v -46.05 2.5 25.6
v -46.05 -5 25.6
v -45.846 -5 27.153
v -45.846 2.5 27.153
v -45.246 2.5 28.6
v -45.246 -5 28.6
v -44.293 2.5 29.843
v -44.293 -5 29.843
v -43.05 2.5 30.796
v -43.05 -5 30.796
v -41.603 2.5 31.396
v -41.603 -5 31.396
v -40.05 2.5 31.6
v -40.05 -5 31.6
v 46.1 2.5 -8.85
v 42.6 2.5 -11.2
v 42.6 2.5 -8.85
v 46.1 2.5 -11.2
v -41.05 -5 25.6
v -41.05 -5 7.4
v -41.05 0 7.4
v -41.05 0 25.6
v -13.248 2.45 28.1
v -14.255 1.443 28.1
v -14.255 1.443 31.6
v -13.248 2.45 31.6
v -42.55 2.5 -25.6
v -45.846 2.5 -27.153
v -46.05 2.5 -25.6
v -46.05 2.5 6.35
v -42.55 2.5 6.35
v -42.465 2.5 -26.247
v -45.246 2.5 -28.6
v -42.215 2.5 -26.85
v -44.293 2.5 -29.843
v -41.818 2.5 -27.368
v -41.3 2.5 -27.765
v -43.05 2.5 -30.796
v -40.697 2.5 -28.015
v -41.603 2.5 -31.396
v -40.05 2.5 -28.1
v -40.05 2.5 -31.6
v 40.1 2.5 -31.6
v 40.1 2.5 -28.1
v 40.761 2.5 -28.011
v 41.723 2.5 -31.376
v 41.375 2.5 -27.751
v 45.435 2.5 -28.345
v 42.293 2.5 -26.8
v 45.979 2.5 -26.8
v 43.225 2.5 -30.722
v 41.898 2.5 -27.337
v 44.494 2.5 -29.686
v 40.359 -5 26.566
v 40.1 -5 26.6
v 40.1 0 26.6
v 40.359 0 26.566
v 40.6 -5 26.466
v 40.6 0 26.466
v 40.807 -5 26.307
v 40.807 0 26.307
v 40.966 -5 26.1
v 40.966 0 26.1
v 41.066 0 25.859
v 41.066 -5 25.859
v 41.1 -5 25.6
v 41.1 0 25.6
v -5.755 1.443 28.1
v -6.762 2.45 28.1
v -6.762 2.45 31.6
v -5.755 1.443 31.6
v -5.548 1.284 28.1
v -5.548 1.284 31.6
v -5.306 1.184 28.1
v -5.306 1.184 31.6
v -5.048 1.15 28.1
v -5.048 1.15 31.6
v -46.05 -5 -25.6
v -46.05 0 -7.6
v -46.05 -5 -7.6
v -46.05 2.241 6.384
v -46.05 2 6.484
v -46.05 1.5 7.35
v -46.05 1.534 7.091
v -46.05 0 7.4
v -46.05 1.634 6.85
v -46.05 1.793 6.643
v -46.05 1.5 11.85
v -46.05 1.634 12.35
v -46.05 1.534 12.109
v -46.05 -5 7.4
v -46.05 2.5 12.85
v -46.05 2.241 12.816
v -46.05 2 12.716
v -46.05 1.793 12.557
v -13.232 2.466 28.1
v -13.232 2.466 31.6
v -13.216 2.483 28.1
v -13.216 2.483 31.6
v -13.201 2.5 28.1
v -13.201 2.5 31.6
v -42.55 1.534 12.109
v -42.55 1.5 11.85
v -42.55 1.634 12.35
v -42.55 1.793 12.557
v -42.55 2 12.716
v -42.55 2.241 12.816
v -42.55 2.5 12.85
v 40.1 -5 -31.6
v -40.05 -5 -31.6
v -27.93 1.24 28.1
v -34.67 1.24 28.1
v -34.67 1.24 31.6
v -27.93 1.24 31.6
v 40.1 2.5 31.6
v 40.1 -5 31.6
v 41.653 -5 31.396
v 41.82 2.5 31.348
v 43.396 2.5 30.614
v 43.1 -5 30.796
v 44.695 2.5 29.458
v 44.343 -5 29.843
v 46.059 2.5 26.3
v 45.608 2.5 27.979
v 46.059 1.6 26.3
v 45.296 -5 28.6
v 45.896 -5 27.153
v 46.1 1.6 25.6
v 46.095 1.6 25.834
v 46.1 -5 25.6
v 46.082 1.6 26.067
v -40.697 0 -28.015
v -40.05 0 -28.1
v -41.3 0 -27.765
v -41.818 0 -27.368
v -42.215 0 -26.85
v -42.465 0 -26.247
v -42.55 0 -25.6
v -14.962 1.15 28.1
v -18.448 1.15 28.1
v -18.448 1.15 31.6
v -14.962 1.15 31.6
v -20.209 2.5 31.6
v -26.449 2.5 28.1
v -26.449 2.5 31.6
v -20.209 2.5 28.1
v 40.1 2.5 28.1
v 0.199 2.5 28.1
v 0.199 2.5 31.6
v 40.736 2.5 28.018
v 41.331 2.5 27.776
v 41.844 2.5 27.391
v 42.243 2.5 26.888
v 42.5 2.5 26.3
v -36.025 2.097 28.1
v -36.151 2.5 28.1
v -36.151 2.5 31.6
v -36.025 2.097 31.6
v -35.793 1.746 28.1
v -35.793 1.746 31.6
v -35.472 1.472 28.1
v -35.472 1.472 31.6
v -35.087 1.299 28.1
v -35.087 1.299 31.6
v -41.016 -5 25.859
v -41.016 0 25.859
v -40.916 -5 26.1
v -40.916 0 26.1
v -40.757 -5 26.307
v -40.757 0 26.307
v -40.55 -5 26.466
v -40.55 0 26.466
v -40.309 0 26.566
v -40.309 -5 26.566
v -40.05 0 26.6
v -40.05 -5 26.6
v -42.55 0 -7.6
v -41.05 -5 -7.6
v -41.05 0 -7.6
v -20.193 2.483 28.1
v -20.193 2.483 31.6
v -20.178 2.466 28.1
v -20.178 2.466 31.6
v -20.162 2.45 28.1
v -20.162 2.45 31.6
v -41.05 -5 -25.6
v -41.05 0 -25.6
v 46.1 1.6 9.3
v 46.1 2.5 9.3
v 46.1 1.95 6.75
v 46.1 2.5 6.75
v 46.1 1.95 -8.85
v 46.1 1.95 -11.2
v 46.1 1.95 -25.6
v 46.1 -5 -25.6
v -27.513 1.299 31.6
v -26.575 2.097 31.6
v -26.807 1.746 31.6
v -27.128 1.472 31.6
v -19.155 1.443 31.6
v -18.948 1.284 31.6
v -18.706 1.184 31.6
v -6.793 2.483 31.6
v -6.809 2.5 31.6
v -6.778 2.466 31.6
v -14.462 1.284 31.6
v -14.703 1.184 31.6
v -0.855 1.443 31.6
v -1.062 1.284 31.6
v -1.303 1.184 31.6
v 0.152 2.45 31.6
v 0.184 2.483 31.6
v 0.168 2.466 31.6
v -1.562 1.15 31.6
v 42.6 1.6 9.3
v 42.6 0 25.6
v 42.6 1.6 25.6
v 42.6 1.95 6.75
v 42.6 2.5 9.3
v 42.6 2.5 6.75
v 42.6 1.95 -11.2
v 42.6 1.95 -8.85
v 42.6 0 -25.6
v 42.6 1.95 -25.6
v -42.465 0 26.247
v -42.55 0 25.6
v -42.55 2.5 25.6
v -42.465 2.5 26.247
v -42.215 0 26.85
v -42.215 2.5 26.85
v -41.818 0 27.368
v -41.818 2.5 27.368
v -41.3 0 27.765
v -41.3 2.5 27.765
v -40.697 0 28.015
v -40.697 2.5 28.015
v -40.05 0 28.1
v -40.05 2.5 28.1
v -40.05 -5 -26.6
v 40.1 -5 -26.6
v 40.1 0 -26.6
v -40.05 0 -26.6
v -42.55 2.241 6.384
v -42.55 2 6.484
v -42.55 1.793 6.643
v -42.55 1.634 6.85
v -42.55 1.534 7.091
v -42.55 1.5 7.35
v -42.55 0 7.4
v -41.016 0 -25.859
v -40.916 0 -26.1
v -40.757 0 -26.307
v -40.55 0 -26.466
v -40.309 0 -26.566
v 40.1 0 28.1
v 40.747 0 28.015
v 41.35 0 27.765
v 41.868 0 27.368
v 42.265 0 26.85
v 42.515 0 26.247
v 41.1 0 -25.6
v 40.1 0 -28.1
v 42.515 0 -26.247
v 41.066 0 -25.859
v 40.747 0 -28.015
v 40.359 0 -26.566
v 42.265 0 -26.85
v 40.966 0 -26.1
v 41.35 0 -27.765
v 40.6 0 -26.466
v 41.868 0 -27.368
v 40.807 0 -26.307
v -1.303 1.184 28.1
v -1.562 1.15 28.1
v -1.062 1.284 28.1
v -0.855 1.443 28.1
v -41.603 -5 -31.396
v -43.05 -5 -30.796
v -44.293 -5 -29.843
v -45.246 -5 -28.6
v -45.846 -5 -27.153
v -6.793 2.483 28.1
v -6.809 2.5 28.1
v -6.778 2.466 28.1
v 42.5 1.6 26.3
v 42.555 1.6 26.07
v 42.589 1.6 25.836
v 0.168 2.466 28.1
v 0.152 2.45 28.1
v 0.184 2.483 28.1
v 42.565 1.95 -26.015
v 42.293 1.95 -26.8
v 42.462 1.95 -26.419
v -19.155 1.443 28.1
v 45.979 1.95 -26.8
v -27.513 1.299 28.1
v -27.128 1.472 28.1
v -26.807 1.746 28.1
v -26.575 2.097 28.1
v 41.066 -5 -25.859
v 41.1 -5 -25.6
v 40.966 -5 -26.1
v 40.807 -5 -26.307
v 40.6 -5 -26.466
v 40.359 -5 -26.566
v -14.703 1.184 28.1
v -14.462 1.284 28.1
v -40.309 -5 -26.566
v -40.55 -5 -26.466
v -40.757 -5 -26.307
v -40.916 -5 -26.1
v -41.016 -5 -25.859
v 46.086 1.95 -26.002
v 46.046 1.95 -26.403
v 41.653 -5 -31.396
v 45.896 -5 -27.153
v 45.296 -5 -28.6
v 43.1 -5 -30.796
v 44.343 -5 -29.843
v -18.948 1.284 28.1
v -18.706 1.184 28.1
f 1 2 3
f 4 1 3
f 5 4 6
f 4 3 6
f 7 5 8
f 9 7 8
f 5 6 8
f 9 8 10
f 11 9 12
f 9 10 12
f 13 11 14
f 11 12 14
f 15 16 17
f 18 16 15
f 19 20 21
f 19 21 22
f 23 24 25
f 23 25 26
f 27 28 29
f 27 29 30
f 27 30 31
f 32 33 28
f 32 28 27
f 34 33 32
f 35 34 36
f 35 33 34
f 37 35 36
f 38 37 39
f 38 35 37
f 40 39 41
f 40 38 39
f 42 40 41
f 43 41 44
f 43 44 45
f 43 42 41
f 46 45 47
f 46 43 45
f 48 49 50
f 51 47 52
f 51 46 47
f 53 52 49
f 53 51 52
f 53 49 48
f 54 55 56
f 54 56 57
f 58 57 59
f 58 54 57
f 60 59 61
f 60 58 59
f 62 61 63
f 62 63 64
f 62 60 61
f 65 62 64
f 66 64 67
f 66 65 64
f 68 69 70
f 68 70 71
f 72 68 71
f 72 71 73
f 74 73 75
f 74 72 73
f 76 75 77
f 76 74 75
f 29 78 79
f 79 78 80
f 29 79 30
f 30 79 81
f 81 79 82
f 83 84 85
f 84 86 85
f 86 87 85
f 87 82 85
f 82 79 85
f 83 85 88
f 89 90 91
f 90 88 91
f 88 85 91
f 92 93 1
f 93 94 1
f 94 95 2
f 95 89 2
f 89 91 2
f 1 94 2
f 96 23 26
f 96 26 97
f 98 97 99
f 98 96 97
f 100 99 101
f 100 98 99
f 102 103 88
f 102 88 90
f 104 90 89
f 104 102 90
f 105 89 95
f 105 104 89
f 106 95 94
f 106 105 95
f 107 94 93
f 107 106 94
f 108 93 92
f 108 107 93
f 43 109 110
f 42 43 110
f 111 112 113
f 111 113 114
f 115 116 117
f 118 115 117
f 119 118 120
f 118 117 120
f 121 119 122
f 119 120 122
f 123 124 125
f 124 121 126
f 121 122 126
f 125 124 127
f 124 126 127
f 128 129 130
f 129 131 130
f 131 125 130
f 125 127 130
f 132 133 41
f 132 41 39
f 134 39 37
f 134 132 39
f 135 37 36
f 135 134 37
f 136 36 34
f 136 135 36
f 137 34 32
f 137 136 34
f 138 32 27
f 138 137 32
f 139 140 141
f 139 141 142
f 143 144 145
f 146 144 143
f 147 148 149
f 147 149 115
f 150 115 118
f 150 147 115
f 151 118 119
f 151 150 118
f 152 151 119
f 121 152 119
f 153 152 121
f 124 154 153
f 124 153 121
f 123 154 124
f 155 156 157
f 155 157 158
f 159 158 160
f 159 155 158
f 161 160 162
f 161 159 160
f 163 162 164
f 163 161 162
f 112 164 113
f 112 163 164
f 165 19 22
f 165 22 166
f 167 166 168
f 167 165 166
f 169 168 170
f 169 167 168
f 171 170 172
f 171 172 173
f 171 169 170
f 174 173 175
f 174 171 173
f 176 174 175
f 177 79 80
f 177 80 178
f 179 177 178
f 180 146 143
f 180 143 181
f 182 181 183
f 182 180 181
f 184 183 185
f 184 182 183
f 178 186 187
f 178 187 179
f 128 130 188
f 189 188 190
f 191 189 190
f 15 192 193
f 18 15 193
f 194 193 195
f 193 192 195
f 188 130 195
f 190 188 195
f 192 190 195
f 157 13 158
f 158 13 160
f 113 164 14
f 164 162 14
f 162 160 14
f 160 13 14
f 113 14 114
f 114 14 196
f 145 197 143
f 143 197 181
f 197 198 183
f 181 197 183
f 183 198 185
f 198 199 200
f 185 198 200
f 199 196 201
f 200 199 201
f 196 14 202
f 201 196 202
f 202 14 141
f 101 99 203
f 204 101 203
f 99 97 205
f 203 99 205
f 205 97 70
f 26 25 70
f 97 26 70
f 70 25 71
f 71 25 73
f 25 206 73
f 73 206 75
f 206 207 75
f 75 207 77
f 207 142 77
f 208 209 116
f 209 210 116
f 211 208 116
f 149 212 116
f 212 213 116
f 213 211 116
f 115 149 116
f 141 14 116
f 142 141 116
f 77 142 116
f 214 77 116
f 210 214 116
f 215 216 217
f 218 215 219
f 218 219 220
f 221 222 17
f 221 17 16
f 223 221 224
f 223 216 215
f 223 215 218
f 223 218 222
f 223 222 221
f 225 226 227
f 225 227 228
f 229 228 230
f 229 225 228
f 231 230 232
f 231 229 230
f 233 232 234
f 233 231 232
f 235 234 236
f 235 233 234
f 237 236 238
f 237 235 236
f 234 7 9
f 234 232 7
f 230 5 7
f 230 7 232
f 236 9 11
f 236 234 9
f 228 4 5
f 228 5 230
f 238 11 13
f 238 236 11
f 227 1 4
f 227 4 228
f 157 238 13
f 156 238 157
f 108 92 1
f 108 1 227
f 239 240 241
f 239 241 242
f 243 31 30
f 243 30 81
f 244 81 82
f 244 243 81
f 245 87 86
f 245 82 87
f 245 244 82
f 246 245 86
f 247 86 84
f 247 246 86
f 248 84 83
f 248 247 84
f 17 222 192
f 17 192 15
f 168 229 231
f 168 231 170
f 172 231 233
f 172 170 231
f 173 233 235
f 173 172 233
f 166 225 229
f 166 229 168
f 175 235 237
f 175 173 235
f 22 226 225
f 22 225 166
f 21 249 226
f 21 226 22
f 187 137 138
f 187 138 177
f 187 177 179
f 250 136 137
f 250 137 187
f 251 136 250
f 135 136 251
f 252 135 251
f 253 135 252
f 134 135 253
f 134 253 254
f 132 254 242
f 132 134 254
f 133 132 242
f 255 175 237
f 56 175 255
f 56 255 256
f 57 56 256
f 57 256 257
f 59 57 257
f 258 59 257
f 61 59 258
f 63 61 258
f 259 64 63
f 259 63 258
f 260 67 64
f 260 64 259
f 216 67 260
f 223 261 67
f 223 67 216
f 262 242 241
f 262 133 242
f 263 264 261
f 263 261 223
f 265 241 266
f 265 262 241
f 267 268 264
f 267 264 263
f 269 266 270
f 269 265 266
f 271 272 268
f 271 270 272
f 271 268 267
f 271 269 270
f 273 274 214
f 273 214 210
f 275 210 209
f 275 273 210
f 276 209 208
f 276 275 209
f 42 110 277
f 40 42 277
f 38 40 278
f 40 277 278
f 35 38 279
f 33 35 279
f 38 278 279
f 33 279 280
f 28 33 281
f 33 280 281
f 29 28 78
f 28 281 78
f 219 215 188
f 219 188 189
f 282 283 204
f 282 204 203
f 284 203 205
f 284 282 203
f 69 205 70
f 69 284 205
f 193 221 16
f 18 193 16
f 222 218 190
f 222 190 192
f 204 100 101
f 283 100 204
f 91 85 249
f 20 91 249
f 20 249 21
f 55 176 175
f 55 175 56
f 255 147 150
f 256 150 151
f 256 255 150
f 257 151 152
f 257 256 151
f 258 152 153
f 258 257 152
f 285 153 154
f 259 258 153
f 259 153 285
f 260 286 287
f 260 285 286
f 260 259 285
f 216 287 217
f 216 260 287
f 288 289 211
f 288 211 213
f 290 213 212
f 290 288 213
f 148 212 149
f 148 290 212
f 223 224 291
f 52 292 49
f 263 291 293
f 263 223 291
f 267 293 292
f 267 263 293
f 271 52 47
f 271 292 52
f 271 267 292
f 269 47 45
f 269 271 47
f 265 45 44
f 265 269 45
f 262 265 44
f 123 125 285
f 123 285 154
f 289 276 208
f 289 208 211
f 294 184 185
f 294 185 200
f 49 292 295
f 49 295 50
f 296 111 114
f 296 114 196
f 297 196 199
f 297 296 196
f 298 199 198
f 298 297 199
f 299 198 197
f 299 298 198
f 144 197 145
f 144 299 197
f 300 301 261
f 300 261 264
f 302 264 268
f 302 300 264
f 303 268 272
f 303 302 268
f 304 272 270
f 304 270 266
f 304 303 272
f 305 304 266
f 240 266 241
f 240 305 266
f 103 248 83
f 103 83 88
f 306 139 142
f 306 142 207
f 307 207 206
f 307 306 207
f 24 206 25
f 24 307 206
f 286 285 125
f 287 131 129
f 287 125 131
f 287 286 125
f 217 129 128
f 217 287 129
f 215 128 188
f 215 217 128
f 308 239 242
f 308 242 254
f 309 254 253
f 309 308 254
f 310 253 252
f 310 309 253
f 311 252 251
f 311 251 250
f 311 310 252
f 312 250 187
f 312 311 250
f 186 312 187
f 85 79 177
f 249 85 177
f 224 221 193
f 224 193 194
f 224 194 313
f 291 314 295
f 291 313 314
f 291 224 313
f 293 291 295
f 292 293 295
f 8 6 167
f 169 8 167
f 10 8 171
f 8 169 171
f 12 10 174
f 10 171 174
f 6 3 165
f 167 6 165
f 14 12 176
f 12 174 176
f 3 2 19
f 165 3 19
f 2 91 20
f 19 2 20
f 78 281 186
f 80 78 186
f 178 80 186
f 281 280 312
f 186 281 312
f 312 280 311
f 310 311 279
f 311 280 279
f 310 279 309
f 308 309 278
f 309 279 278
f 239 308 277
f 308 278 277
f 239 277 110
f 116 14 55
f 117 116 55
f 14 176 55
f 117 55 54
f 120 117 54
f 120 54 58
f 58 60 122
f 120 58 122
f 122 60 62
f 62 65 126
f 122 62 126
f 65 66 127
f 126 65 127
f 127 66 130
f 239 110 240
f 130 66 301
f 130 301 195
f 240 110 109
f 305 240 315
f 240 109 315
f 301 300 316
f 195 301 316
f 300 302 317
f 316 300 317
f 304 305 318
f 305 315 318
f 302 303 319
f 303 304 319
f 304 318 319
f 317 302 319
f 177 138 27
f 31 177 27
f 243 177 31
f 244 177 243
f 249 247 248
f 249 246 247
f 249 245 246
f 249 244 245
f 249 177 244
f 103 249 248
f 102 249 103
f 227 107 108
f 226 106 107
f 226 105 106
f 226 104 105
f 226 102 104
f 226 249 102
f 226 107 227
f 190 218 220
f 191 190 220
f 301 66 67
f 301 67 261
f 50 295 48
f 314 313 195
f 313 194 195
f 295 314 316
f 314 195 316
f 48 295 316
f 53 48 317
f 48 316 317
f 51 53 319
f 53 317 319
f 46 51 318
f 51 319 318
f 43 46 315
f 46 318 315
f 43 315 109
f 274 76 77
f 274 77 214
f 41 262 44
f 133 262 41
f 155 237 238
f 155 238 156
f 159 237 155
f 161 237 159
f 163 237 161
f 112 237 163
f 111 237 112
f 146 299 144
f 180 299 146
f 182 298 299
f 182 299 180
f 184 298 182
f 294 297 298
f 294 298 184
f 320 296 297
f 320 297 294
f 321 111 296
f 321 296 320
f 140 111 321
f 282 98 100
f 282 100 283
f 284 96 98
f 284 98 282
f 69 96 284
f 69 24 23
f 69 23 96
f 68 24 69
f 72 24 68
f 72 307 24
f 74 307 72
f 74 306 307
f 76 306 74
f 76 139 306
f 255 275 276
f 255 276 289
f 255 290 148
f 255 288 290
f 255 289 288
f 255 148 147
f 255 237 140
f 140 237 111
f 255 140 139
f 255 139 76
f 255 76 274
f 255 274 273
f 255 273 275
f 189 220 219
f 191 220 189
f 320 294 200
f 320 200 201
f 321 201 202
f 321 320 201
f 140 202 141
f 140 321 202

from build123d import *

# Parameters (mm, degrees)
EXTRUDE_THIN1_DEPTH      = 2.5
EXTRUDE_THIN1_DEPTH_BACK = 5
EXTRUDE_THIN2_START      = -5
EXTRUDE_THIN2_DEPTH      = 5
CUT_EXTRUDE3_DEPTH       = 76.51403843
CUT_EXTRUDE3_DEPTH_BACK  = 1
CUT_EXTRUDE4_START       = -0.20682878
CUT_EXTRUDE4_OUTLINE_W   = 17
CUT_EXTRUDE4_OUTLINE_H   = 0.9
CUT_EXTRUDE4_OUTLINE_W_2 = 15.6
CUT_EXTRUDE4_OUTLINE_H_2 = 0.55
CUT_EXTRUDE4_DEPTH       = 3.80682878
SKETCH10_W               = 10
SKETCH10_H               = 15
CUT_EXTRUDE6_DEPTH       = 57.113902021
CUT_EXTRUDE11_DEPTH      = 95.199363055
CUT_EXTRUDE11_DEPTH_BACK = 5


# Read off the part's stored shape, not the designer's step: Cut-Extrude4
with BuildPart() as part:
    # Sketch1 → Extrude-Thin1 (new, two sides: drawn at the far end of the back side and taken through both)
    with BuildSketch(Plane(origin=(0, 0, 0), x_dir=(1, 0, 0), z_dir=(0, 1, 0)).offset(-EXTRUDE_THIN1_DEPTH_BACK)):
        with BuildLine():
            Line((-46.05, 25.6), (-46.05, -25.6))
            ThreePointArc((-46.05, -25.6), (-44.292640687, -29.842640687), (-40.05, -31.6))
            Line((-40.05, -31.6), (40.1, -31.6))
            ThreePointArc((40.1, -31.6), (44.342640687, -29.842640687), (46.1, -25.6))
            Line((46.1, -25.6), (46.1, 25.6))
            ThreePointArc((46.1, 25.6), (44.342640687, 29.842640687), (40.1, 31.6))
            Line((40.1, 31.6), (-40.05, 31.6))
            ThreePointArc((-40.05, 31.6), (-44.292640687, 29.842640687), (-46.05, 25.6))
        make_face()
        with BuildLine():
            Line((-42.55, 25.6), (-42.55, -25.6))
            ThreePointArc((-42.55, -25.6), (-41.817766953, -27.367766953), (-40.05, -28.1))
            Line((-40.05, -28.1), (40.1, -28.1))
            ThreePointArc((40.1, -28.1), (41.867766953, -27.367766953), (42.6, -25.6))
            Line((42.6, -25.6), (42.6, 25.6))
            ThreePointArc((42.6, 25.6), (41.867766953, 27.367766953), (40.1, 28.1))
            Line((40.1, 28.1), (-40.05, 28.1))
            ThreePointArc((-40.05, 28.1), (-41.817766953, 27.367766953), (-42.55, 25.6))
        make_face(mode=Mode.SUBTRACT)
    extrude(amount=EXTRUDE_THIN1_DEPTH + EXTRUDE_THIN1_DEPTH_BACK)

    # Sketch1<3> → Extrude-Thin2 (add)
    with BuildSketch(Plane(origin=(0, 0, 0), x_dir=(1, 0, 0), z_dir=(0, 1, 0)).offset(EXTRUDE_THIN2_START)):
        with BuildLine():
            Line((-42.55, 25.6), (-42.55, -25.6))
            ThreePointArc((-42.55, -25.6), (-41.817766953, -27.367766953), (-40.05, -28.1))
            Line((-40.05, -28.1), (40.1, -28.1))
            ThreePointArc((40.1, -28.1), (41.867766953, -27.367766953), (42.6, -25.6))
            Line((42.6, -25.6), (42.6, 25.6))
            ThreePointArc((42.6, 25.6), (41.867766953, 27.367766953), (40.1, 28.1))
            Line((40.1, 28.1), (-40.05, 28.1))
            ThreePointArc((-40.05, 28.1), (-41.817766953, 27.367766953), (-42.55, 25.6))
        make_face()
        with BuildLine():
            Line((-41.05, 25.6), (-41.05, -25.6))
            ThreePointArc((-41.05, -25.6), (-40.757106781, -26.307106781), (-40.05, -26.6))
            Line((-40.05, -26.6), (40.1, -26.6))
            ThreePointArc((40.1, -26.6), (40.807106781, -26.307106781), (41.1, -25.6))
            Line((41.1, -25.6), (41.1, 25.6))
            ThreePointArc((41.1, 25.6), (40.807106781, 26.307106781), (40.1, 26.6))
            Line((40.1, 26.6), (-40.05, 26.6))
            ThreePointArc((-40.05, 26.6), (-40.757106781, 26.307106781), (-41.05, 25.6))
        make_face(mode=Mode.SUBTRACT)
    extrude(amount=EXTRUDE_THIN2_DEPTH)

    # Sketch5 → Cut-Extrude3 (cut, two sides: drawn at the far end of the back side and taken through both)
    with BuildSketch(Plane.XY.offset(28).offset(-CUT_EXTRUDE3_DEPTH_BACK)):
        with BuildLine():
            Line((-26.43, 3.5), (-36.17, 3.5))
            Line((-36.17, 3.5), (-36.17, 2.74))
            ThreePointArc((-36.17, 2.74), (-35.730660172, 1.679339828), (-34.67, 1.24))
            Line((-34.67, 1.24), (-27.93, 1.24))
            ThreePointArc((-27.93, 1.24), (-26.869339828, 1.679339828), (-26.43, 2.74))
            Line((-26.43, 2.74), (-26.43, 3.5))
        make_face()
        with BuildLine():
            Line((-12.954733256, 3.5), (-20.454733256, 3.5))
            Line((-20.454733256, 3.5), (-20.454733256, 3.157106781))
            ThreePointArc((-20.454733256, 3.157106781), (-20.378612788, 2.774423349), (-20.161840037, 2.45))
            Line((-20.161840037, 2.45), (-19.154733256, 1.442893219))
            ThreePointArc((-19.154733256, 1.442893219), (-18.830309907, 1.226120467), (-18.447626475, 1.15))
            Line((-18.447626475, 1.15), (-14.961840037, 1.15))
            ThreePointArc((-14.961840037, 1.15), (-14.579156605, 1.226120467), (-14.254733256, 1.442893219))
            Line((-14.254733256, 1.442893219), (-13.247626475, 2.45))
            ThreePointArc((-13.247626475, 2.45), (-13.030853723, 2.774423349), (-12.954733256, 3.157106781))
            Line((-12.954733256, 3.157106781), (-12.954733256, 3.5))
        make_face()
        with BuildLine():
            Line((0.445266744, 3.5), (-7.054733256, 3.5))
            Line((-7.054733256, 3.5), (-7.054733256, 3.157106781))
            ThreePointArc((-7.054733256, 3.157106781), (-6.978612788, 2.774423349), (-6.761840037, 2.45))
            Line((-6.761840037, 2.45), (-5.754733256, 1.442893219))
            ThreePointArc((-5.754733256, 1.442893219), (-5.430309907, 1.226120467), (-5.047626475, 1.15))
            Line((-5.047626475, 1.15), (-1.561840037, 1.15))
            ThreePointArc((-1.561840037, 1.15), (-1.179156605, 1.226120467), (-0.854733256, 1.442893219))
            Line((-0.854733256, 1.442893219), (0.152373525, 2.45))
            ThreePointArc((0.152373525, 2.45), (0.369146277, 2.774423349), (0.445266744, 3.157106781))
            Line((0.445266744, 3.157106781), (0.445266744, 3.5))
        make_face()
    extrude(amount=CUT_EXTRUDE3_DEPTH + CUT_EXTRUDE3_DEPTH_BACK, mode=Mode.SUBTRACT)

    # Cut-Extrude4 outline → Cut-Extrude4 (cut)
    with BuildSketch(Plane(origin=(42.5, 0, 0), x_dir=(0, 0, -1), z_dir=(1, 0, 0)).offset(CUT_EXTRUDE4_START)):
        with Locations((-17.8, 2.05)):
            Rectangle(CUT_EXTRUDE4_OUTLINE_W, CUT_EXTRUDE4_OUTLINE_H)
        with Locations((19, 2.225)):
            Rectangle(CUT_EXTRUDE4_OUTLINE_W_2, CUT_EXTRUDE4_OUTLINE_H_2)
        with Locations((1.05, 2.225)):
            Rectangle(CUT_EXTRUDE4_OUTLINE_W_2, CUT_EXTRUDE4_OUTLINE_H_2)
    extrude(amount=CUT_EXTRUDE4_DEPTH, mode=Mode.SUBTRACT)

    # Sketch10 → Cut-Extrude6 (cut, through all)
    with BuildSketch(Plane(origin=(0, 0, 0), x_dir=(1, 0, 0), z_dir=(0, 1, 0))):
        with Locations((-46.05, 0.1)):
            Rectangle(SKETCH10_W, SKETCH10_H)
    extrude(amount=-CUT_EXTRUDE6_DEPTH, mode=Mode.SUBTRACT)

    # Sketch11 → Cut-Extrude11 (cut, two sides: drawn at the far end of the back side and taken through both)
    with BuildSketch(Plane.ZY.offset(42.5).offset(-CUT_EXTRUDE11_DEPTH_BACK)):
        with BuildLine():
            ThreePointArc((6.35, 2.5), (6.642893219, 1.792893219), (7.35, 1.5))
            Line((7.35, 1.5), (11.85, 1.5))
            ThreePointArc((11.85, 1.5), (12.557106781, 1.792893219), (12.85, 2.5))
            Line((12.85, 2.5), (6.35, 2.5))
        make_face()
    extrude(amount=CUT_EXTRUDE11_DEPTH + CUT_EXTRUDE11_DEPTH_BACK, mode=Mode.SUBTRACT)


solid = part.part
